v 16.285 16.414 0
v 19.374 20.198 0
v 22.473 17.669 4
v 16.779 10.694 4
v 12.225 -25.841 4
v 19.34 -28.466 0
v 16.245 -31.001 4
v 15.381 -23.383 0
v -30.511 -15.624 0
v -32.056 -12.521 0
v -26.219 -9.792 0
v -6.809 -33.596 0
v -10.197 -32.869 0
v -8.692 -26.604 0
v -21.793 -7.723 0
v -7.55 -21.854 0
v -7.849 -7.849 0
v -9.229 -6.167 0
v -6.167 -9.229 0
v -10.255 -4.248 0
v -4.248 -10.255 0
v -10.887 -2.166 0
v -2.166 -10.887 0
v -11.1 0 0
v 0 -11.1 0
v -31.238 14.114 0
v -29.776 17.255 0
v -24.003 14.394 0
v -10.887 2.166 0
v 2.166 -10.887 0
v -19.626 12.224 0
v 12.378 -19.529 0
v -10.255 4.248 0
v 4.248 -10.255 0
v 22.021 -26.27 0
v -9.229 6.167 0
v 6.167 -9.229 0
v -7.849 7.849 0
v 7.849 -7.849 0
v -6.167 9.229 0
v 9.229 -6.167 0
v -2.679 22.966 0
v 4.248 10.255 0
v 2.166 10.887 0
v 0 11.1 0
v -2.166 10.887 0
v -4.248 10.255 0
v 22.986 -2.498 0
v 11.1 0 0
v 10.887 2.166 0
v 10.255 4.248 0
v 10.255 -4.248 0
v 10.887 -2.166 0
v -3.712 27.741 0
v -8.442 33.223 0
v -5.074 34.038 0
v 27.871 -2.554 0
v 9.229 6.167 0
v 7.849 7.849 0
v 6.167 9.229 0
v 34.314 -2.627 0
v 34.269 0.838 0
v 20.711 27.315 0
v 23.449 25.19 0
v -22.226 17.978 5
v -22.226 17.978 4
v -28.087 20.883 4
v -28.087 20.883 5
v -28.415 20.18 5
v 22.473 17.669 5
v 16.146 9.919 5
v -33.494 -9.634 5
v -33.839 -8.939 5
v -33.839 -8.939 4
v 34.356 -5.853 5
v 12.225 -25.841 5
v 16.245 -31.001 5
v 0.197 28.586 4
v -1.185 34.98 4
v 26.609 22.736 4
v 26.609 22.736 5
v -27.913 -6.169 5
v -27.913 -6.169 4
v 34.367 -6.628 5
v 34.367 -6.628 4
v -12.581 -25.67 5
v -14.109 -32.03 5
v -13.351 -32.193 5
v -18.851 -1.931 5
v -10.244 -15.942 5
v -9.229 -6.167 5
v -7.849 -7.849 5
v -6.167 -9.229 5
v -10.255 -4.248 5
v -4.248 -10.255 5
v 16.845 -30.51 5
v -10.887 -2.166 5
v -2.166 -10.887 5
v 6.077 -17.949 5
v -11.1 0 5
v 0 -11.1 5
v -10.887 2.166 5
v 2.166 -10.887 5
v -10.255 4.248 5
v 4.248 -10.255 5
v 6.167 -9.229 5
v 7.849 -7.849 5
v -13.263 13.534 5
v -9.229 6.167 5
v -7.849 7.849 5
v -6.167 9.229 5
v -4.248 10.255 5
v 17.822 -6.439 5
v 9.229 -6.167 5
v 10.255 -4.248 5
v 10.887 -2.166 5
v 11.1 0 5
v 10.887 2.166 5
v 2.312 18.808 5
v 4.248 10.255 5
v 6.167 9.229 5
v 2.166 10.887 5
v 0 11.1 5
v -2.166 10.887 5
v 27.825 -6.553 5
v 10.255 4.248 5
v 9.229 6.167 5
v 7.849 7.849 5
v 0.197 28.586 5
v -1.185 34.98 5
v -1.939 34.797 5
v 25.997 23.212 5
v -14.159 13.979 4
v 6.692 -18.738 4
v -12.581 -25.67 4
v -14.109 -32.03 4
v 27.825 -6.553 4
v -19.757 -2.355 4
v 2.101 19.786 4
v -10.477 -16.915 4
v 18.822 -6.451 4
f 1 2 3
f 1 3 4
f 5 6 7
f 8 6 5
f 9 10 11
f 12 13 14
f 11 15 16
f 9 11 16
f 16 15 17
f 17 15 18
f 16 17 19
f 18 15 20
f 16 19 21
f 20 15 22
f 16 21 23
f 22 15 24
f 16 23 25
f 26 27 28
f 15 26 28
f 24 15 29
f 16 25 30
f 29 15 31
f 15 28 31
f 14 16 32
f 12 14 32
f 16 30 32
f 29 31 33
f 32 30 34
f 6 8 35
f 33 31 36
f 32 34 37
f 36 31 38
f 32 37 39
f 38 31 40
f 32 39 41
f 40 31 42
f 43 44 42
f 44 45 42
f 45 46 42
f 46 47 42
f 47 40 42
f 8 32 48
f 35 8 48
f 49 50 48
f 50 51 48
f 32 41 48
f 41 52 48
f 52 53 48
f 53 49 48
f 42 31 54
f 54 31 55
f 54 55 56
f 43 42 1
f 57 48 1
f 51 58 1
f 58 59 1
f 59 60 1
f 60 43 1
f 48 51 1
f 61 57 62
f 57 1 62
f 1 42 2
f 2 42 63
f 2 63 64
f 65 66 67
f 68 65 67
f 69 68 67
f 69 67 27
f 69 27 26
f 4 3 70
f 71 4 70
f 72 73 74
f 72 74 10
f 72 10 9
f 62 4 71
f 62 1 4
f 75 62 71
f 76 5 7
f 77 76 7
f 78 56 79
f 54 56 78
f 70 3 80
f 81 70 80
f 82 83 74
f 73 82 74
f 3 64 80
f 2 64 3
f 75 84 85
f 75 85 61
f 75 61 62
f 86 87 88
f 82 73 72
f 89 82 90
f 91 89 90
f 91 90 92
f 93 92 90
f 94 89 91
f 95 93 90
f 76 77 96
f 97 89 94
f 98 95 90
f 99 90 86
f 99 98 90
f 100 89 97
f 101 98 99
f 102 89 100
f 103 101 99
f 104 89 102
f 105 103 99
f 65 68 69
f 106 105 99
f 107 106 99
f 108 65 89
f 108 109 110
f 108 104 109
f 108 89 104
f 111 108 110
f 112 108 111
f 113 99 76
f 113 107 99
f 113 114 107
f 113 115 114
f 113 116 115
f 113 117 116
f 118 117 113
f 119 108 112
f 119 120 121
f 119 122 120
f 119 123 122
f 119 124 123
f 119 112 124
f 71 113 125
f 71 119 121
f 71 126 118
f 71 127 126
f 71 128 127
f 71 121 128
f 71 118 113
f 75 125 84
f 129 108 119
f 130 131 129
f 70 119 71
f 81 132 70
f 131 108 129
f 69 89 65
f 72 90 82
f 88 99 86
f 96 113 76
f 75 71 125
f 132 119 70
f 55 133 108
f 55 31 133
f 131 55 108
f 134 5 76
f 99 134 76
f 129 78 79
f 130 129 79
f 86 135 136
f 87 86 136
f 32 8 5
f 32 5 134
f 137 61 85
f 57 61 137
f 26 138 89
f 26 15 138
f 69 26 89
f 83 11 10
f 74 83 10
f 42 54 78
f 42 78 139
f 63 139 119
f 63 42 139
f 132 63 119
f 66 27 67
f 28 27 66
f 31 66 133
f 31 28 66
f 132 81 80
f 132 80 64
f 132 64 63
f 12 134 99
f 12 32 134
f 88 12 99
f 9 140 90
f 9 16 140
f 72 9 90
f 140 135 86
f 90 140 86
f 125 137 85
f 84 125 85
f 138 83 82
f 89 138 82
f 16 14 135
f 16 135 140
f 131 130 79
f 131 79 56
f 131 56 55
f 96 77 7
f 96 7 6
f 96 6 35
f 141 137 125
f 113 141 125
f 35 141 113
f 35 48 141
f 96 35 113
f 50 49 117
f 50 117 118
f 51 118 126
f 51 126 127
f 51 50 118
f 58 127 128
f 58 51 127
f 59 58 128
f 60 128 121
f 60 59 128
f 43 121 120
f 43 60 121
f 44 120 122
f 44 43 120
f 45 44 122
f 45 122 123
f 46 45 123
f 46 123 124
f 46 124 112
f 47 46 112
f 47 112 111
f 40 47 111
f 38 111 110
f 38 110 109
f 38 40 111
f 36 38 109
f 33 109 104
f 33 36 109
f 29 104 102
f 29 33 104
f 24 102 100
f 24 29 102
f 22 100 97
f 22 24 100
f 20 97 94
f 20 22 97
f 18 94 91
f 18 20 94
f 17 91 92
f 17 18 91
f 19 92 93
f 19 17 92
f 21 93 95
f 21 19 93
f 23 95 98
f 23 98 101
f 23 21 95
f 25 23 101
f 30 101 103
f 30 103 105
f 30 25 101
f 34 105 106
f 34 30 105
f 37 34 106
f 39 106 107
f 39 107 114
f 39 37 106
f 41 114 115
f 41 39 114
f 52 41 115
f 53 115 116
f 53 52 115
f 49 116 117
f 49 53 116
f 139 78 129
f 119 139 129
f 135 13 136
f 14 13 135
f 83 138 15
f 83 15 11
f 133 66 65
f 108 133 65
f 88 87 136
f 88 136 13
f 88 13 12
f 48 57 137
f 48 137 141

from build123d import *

# Parameters (mm, degrees)
F0_R         = 11.1
F1_DEPTH     = 5
F2_T4_DEPTH  = 66.9224244324
F2_T10_DEPTH = 66.9224244324
F2_T16_DEPTH = 66.9224244324
F2_T22_DEPTH = 66.9224244324
F2_T28_DEPTH = 66.9224244324
F2_T34_DEPTH = 66.9224244324
F2_T40_DEPTH = 66.9224244324
F3_SIZE      = 4


# Not quite as in the source:
# - a fillet or chamfer that OpenCascade refuses, or shapes differently, is made with other operations: its cross-section is extruded or revolved along the edge and cut away or added


with BuildPart() as f1:
    # F0 (on Top) → F1 (new body)
    with BuildSketch(Plane.XY):
        with BuildLine():
            ThreePointArc((13.9102940248, -6.3947663514), (14.9558155311, -3.2730564225), (15.3097784616, 0))
            ThreePointArc((15.3097784616, 0), (14.9174264356, 3.4437922532), (13.7604803953, 6.7110726292))
            ThreePointArc((13.7604803953, 6.7110726292), (13.7168049275, 6.7998955231), (13.6725561219, 6.8884341936))
            ThreePointArc((13.6725561219, 6.8884341936), (9.4080501116, 12.077992782), (3.3325913325, 14.9426621308))
            ThreePointArc((3.3325913325, 14.9426621308), (3.2359155889, 14.9638954436), (3.1391045899, 14.9845032923))
            ThreePointArc((3.1391045899, 14.9845032923), (-3.577131702, 14.8860150924), (-9.6048069761, 11.9221222731))
            ThreePointArc((-9.6048069761, 11.9221222731), (-9.6816841888, 11.8597768872), (-9.7581567243, 11.7969357838))
            ThreePointArc((-9.7581567243, 11.7969357838), (-13.8686603838, 6.4845644188), (-15.3095897294, -0.0760188232))
            ThreePointArc((-15.3095897294, -0.0760188232), (-15.308778302, -0.1749955606), (-15.307326995, -0.2739649836))
            ThreePointArc((-15.307326995, -0.2739649836), (-13.7168049275, -6.7998955231), (-9.4859391577, -12.0169161951))
            ThreePointArc((-9.4859391577, -12.0169161951), (-9.4080501116, -12.077992782), (-9.3297678259, -12.1385645305))
            ThreePointArc((-9.3297678259, -12.1385645305), (-3.2359155889, -14.9638954436), (3.4808170776, -14.9088305717))
            ThreePointArc((3.4808170776, -14.9088305717), (3.577131702, -14.8860150924), (3.6732968087, -14.8625774043))
            ThreePointArc((3.6732968087, -14.8625774043), (9.6816841888, -11.8597768872), (13.8264470578, -6.5740914431))
            ThreePointArc((13.8264470578, -6.5740914431), (13.8686603838, -6.4845644188), (13.9102940248, -6.3947663514))
        make_face()
        Circle(F0_R, mode=Mode.SUBTRACT)
        with BuildLine():
            ThreePointArc((13.6725561219, 6.8884341936), (13.7168049275, 6.7998955231), (13.7604803953, 6.7110726292))
            Line((13.7604803953, 6.7110726292), (28.1393743339, 1.1806929027))
            Line((28.1393743339, 1.1806929027), (27.8254993307, -6.5534854768))
            Line((27.8254993307, -6.5534854768), (34.3666750494, -6.6280952053))
            Line((34.3666750494, -6.6280952053), (34.1806906403, 7.5286378152))
            Line((34.1806906403, 7.5286378152), (22.47263633, 17.6688200307))
            Line((22.47263633, 17.6688200307), (13.6725561219, 6.8884341936))
        make_face()
        with BuildLine():
            ThreePointArc((13.7604803953, 6.7110726292), (14.9174264356, 3.4437922532), (15.3097784616, 0))
            ThreePointArc((15.3097784616, 0), (14.9558155311, -3.2730564225), (13.9102940248, -6.3947663514))
            Line((13.9102940248, -6.3947663514), (27.8254993307, -6.5534854768))
            Line((27.8254993307, -6.5534854768), (28.1393743339, 1.1806929027))
            Line((28.1393743339, 1.1806929027), (13.7604803953, 6.7110726292))
        make_face()
        with BuildLine():
            Line((27.8254993307, -6.5534854768), (13.9102940248, -6.3947663514))
            ThreePointArc((13.9102940248, -6.3947663514), (13.8686603838, -6.4845644188), (13.8264470578, -6.5740914431))
            Line((13.8264470578, -6.5740914431), (18.4677158103, -21.2640987672))
            Line((18.4677158103, -21.2640987672), (12.2251937987, -25.8408827536))
            Line((12.2251937987, -25.8408827536), (16.2452179168, -31.0014982676))
            Line((16.2452179168, -31.0014982676), (27.1974380987, -22.0295111355))
            Line((27.1974380987, -22.0295111355), (27.8254993307, -6.5534854768))
        make_face()
        with BuildLine():
            Line((18.4677158103, -21.2640987672), (13.8264470578, -6.5740914431))
            ThreePointArc((13.8264470578, -6.5740914431), (9.6816841888, -11.8597768872), (3.6732968087, -14.8625774043))
            Line((3.6732968087, -14.8625774043), (12.2251937987, -25.8408827536))
            Line((12.2251937987, -25.8408827536), (18.4677158103, -21.2640987672))
        make_face()
        with BuildLine():
            Line((12.2251937987, -25.8408827536), (3.6732968087, -14.8625774043))
            ThreePointArc((3.6732968087, -14.8625774043), (3.577131702, -14.8860150924), (3.4808170776, -14.9088305717))
            Line((3.4808170776, -14.9088305717), (-5.1105093912, -27.6965903568))
            Line((-5.1105093912, -27.6965903568), (-12.5809320123, -25.669568259))
            Line((-12.5809320123, -25.669568259), (-14.1092196492, -32.0301408191))
            Line((-14.1092196492, -32.0301408191), (-0.2660400579, -34.9989888809))
            Line((-0.2660400579, -34.9989888809), (12.2251937987, -25.8408827536))
        make_face()
        with BuildLine():
            Line((-5.1105093912, -27.6965903568), (3.4808170776, -14.9088305717))
            ThreePointArc((3.4808170776, -14.9088305717), (-3.2359155889, -14.9638954436), (-9.3297678259, -12.1385645305))
            Line((-9.3297678259, -12.1385645305), (-12.5809320123, -25.669568259))
            Line((-12.5809320123, -25.669568259), (-5.1105093912, -27.6965903568))
        make_face()
        with BuildLine():
            Line((-12.5809320123, -25.669568259), (-9.3297678259, -12.1385645305))
            ThreePointArc((-9.3297678259, -12.1385645305), (-9.4080501116, -12.077992782), (-9.4859391577, -12.0169161951))
            Line((-9.4859391577, -12.0169161951), (-24.8404167857, -13.2729845003))
            Line((-24.8404167857, -13.2729845003), (-27.9133594138, -6.1685453016))
            Line((-27.9133594138, -6.1685453016), (-33.8391270437, -8.939434038))
            Line((-33.8391270437, -8.939434038), (-27.5291846246, -21.6135141498))
            Line((-27.5291846246, -21.6135141498), (-12.5809320123, -25.669568259))
        make_face()
        with BuildLine():
            ThreePointArc((-15.307326995, -0.2739649836), (-15.308778302, -0.1749955606), (-15.3095897294, -0.0760188232))
            Line((-15.3095897294, -0.0760188232), (-25.8649836884, 11.1454494045))
            Line((-25.8649836884, 11.1454494045), (-22.2264578479, 17.9775180833))
            Line((-22.2264578479, 17.9775180833), (-28.0874815819, 20.8828489049))
            Line((-28.0874815819, 20.8828489049), (-34.062291676, 8.0473775715))
            Line((-34.062291676, 8.0473775715), (-27.9133594138, -6.1685453016))
            Line((-27.9133594138, -6.1685453016), (-15.307326995, -0.2739649836))
        make_face()
        with BuildLine():
            ThreePointArc((-15.3095897294, -0.0760188232), (-13.8686603838, 6.4845644188), (-9.7581567243, 11.7969357838))
            Line((-9.7581567243, 11.7969357838), (-22.2264578479, 17.9775180833))
            Line((-22.2264578479, 17.9775180833), (-25.8649836884, 11.1454494045))
            Line((-25.8649836884, 11.1454494045), (-15.3095897294, -0.0760188232))
        make_face()
        with BuildLine():
            ThreePointArc((-9.7581567243, 11.7969357838), (-9.6816841888, 11.8597768872), (-9.6048069761, 11.9221222731))
            Line((-9.6048069761, 11.9221222731), (-7.4126903243, 27.171132582))
            Line((-7.4126903243, 27.171132582), (0.1974198146, 28.5861436769))
            Line((0.1974198146, 28.5861436769), (-1.1853896087, 34.97992069))
            Line((-1.1853896087, 34.97992069), (-14.9457983513, 31.6484298448))
            Line((-14.9457983513, 31.6484298448), (-22.2264578479, 17.9775180833))
            Line((-22.2264578479, 17.9775180833), (-9.7581567243, 11.7969357838))
        make_face()
        with BuildLine():
            ThreePointArc((-9.6048069761, 11.9221222731), (-3.577131702, 14.8860150924), (3.1391045899, 14.9845032923))
            Line((3.1391045899, 14.9845032923), (0.1974198146, 28.5861436769))
            Line((0.1974198146, 28.5861436769), (-7.4126903243, 27.171132582))
            Line((-7.4126903243, 27.171132582), (-9.6048069761, 11.9221222731))
        make_face()
        with BuildLine():
            ThreePointArc((3.1391045899, 14.9845032923), (3.2359155889, 14.9638954436), (3.3325913325, 14.9426621308))
            Line((3.3325913325, 14.9426621308), (16.6215100454, 22.7363987351))
            Line((16.6215100454, 22.7363987351), (22.47263633, 17.6688200307))
            Line((22.47263633, 17.6688200307), (26.6093249174, 22.7363987351))
            Line((26.6093249174, 22.7363987351), (15.4251859707, 31.4175689347))
            Line((15.4251859707, 31.4175689347), (0.1974198146, 28.5861436769))
            Line((0.1974198146, 28.5861436769), (3.1391045899, 14.9845032923))
        make_face()
        with BuildLine():
            ThreePointArc((3.3325913325, 14.9426621308), (9.4080501116, 12.077992782), (13.6725561219, 6.8884341936))
            Line((13.6725561219, 6.8884341936), (22.47263633, 17.6688200307))
            Line((22.47263633, 17.6688200307), (16.6215100454, 22.7363987351))
            Line((16.6215100454, 22.7363987351), (3.3325913325, 14.9426621308))
        make_face()
        with BuildLine():
            Line((-24.8404167857, -13.2729845003), (-9.4859391577, -12.0169161951))
            ThreePointArc((-9.4859391577, -12.0169161951), (-13.7168049275, -6.7998955231), (-15.307326995, -0.2739649836))
            Line((-15.307326995, -0.2739649836), (-27.9133594138, -6.1685453016))
            Line((-27.9133594138, -6.1685453016), (-24.8404167857, -13.2729845003))
        make_face()
    extrude(amount=F1_DEPTH)

    # F2: chamfer of 10 on 7 edges, made by hand


with BuildPart() as f2_tool2:
    # F2_s3 → F2_t4 (new body)
    with BuildSketch(Plane(origin=(-1.8906345765, -46.5870327993, 0), x_dir=(0, 0, 1), z_dir=(0.0405494722, 0.9991775319, 0))):
        with BuildLine():
            Line((-5.2828427125, 28.3511968353), (5.2828427125, 17.7855114104))
            Line((5.2828427125, 17.7855114104), (5.4828427125, 17.7855114104))
            ThreePointArc((5.4828427125, 17.7855114104), (5.2, 22.9269327666), (5.2, 28.0683541229))
            Line((5.2, 28.0683541229), (5, 28.2683541229))
            ThreePointArc((5, 28.2683541229), (-0.1414213562, 28.2683541229), (-5.2828427125, 28.5511968353))
            Line((-5.2828427125, 28.5511968353), (-5.2828427125, 28.3511968353))
        make_face()
    extrude(amount=F2_T4_DEPTH)

    split(bisect_by=Plane(origin=(21.7213280078, -26.5155047015, 0), x_dir=(0, 0, 1), z_dir=(-0.6337064464, 0.7735736163, 0)), keep=Keep.TOP)

    split(bisect_by=Plane(origin=(-0.0711207687, -6.2352920297, 0), x_dir=(0, 0, 1), z_dir=(-0.0114054229, -0.999934956, 0)), keep=Keep.TOP)


with BuildPart() as f1_1:
    add(f1.part)

    # F2_t1: cut F2_tool2
    add(f2_tool2.part, mode=Mode.SUBTRACT)


with BuildPart() as f2_tool8:
    # F2_s9 → F2_t10 (new body)
    with BuildSketch(Plane(origin=(-37.6020002947, -27.5683822155, 0), x_dir=(0, 0, 1), z_dir=(0.8064706334, 0.5912741475, 0))):
        with BuildLine():
            Line((-5.2828427125, 28.3511968353), (5.2828427125, 17.7855114104))
            Line((5.2828427125, 17.7855114104), (5.4828427125, 17.7855114104))
            ThreePointArc((5.4828427125, 17.7855114104), (5.2, 22.9269327666), (5.2, 28.0683541229))
            Line((5.2, 28.0683541229), (5, 28.2683541229))
            ThreePointArc((5, 28.2683541229), (-0.1414213562, 28.2683541229), (-5.2828427125, 28.5511968353))
            Line((-5.2828427125, 28.5511968353), (-5.2828427125, 28.3511968353))
        make_face()
    extrude(amount=F2_T10_DEPTH)

    split(bisect_by=Plane(origin=(-7.1876298535, -33.51456485, 0), x_dir=(0, 0, 1), z_dir=(0.2096947006, 0.9777669112, 0)), keep=Keep.TOP)

    split(bisect_by=Plane(origin=(-4.9192906851, -3.8320365361, 0), x_dir=(0, 0, 1), z_dir=(-0.7888917939, -0.6145321289, 0)), keep=Keep.TOP)


with BuildPart() as f1_2:
    add(f1_1.part)

    # F2_t7: cut F2_tool8
    add(f2_tool8.part, mode=Mode.SUBTRACT)


with BuildPart() as f2_tool14:
    # F2_s15 → F2_t16 (new body)
    with BuildSketch(Plane(origin=(-44.99829285, 12.2098224691, 0), x_dir=(0, 0, 1), z_dir=(0.9651029587, -0.2618707298, 0))):
        with BuildLine():
            Line((-5.2828427125, 28.3511968353), (5.2828427125, 17.7855114104))
            Line((5.2828427125, 17.7855114104), (5.4828427125, 17.7855114104))
            ThreePointArc((5.4828427125, 17.7855114104), (5.2, 22.9269327666), (5.2, 28.0683541229))
            Line((5.2, 28.0683541229), (5, 28.2683541229))
            ThreePointArc((5, 28.2683541229), (-0.1414213562, 28.2683541229), (-5.2828427125, 28.5511968353))
            Line((-5.2828427125, 28.5511968353), (-5.2828427125, 28.3511968353))
        make_face()
    extrude(amount=F2_T16_DEPTH)

    split(bisect_by=Plane(origin=(-30.6841558342, -15.2764740939, 0), x_dir=(0, 0, 1), z_dir=(0.895191461, 0.4456817791, 0)), keep=Keep.TOP)

    split(bisect_by=Plane(origin=(-6.0631343805, 1.4568206285, 0), x_dir=(0, 0, 1), z_dir=(-0.9723265537, 0.2336259255, 0)), keep=Keep.TOP)


with BuildPart() as f1_3:
    add(f1_2.part)

    # F2_t13: cut F2_tool14
    add(f2_tool14.part, mode=Mode.SUBTRACT)


with BuildPart() as f2_tool20:
    # F2_s21 → F2_t22 (new body)
    with BuildSketch(Plane(origin=(-18.5099530914, 42.7937817994, 0), x_dir=(0, 0, 1), z_dir=(0.3969930716, -0.9178216064, 0))):
        with BuildLine():
            Line((-5.2828427125, 28.3511968353), (5.2828427125, 17.7855114104))
            Line((5.2828427125, 17.7855114104), (5.4828427125, 17.7855114104))
            ThreePointArc((5.4828427125, 17.7855114104), (5.2, 22.9269327666), (5.2, 28.0683541229))
            Line((5.2, 28.0683541229), (5, 28.2683541229))
            ThreePointArc((5, 28.2683541229), (-0.1414213562, 28.2683541229), (-5.2828427125, 28.5511968353))
            Line((-5.2828427125, 28.5511968353), (-5.2828427125, 28.3511968353))
        make_face()
    extrude(amount=F2_T22_DEPTH)

    split(bisect_by=Plane(origin=(-31.074886629, 14.4651132382, 0), x_dir=(0, 0, 1), z_dir=(0.9065907927, -0.4220108229, 0)), keep=Keep.TOP)

    split(bisect_by=Plane(origin=(-2.6413142219, 5.6486621461, 0), x_dir=(0, 0, 1), z_dir=(-0.4235795866, 0.9058588929, 0)), keep=Keep.TOP)


with BuildPart() as f1_4:
    add(f1_3.part)

    # F2_t19: cut F2_tool20
    add(f2_tool20.part, mode=Mode.SUBTRACT)


with BuildPart() as f2_tool26:
    # F2_s27 → F2_t28 (new body)
    with BuildSketch(Plane(origin=(21.9167588793, 41.1531506007, 0), x_dir=(0, 0, 1), z_dir=(-0.4700606956, -0.8826340932, 0))):
        with BuildLine():
            Line((-5.2828427125, 28.3511968353), (5.2828427125, 17.7855114104))
            Line((5.2828427125, 17.7855114104), (5.4828427125, 17.7855114104))
            ThreePointArc((5.4828427125, 17.7855114104), (5.2, 22.9269327666), (5.2, 28.0683541229))
            Line((5.2, 28.0683541229), (5, 28.2683541229))
            ThreePointArc((5, 28.2683541229), (-0.1414213562, 28.2683541229), (-5.2828427125, 28.5511968353))
            Line((-5.2828427125, 28.5511968353), (-5.2828427125, 28.3511968353))
        make_face()
    extrude(amount=F2_T28_DEPTH)

    split(bisect_by=Plane(origin=(-8.06559398, 33.3141752674, 0), x_dir=(0, 0, 1), z_dir=(0.2353087664, -0.9719206678, 0)), keep=Keep.TOP)

    split(bisect_by=Plane(origin=(2.7694694188, 5.586945856, 0), x_dir=(0, 0, 1), z_dir=(0.4441314486, 0.8959616378, 0)), keep=Keep.TOP)


with BuildPart() as f1_5:
    add(f1_4.part)

    # F2_t25: cut F2_tool26
    add(f2_tool26.part, mode=Mode.SUBTRACT)


with BuildPart() as f2_tool32:
    # F2_s33 → F2_t34 (new body)
    with BuildSketch(Plane(origin=(45.8397043935, 8.5233576284, 0), x_dir=(0, 0, 1), z_dir=(-0.9831491715, -0.1828051054, 0))):
        with BuildLine():
            Line((-5.2828427125, 28.3511968353), (5.2828427125, 17.7855114104))
            Line((5.2828427125, 17.7855114104), (5.4828427125, 17.7855114104))
            ThreePointArc((5.4828427125, 17.7855114104), (5.2, 22.9269327666), (5.2, 28.0683541229))
            Line((5.2, 28.0683541229), (5, 28.2683541229))
            ThreePointArc((5, 28.2683541229), (-0.1414213562, 28.2683541229), (-5.2828427125, 28.5511968353))
            Line((-5.2828427125, 28.5511968353), (-5.2828427125, 28.3511968353))
        make_face()
    extrude(amount=F2_T34_DEPTH)

    split(bisect_by=Plane(origin=(21.017255444, 27.0769838349, 0), x_dir=(0, 0, 1), z_dir=(-0.6131655604, -0.7899544263, 0)), keep=Keep.TOP)

    split(bisect_by=Plane(origin=(6.0947861002, 1.3181453834, 0), x_dir=(0, 0, 1), z_dir=(0.9774024444, 0.2113869951, 0)), keep=Keep.TOP)


with BuildPart() as f1_6:
    add(f1_5.part)

    # F2_t31: cut F2_tool32
    add(f2_tool32.part, mode=Mode.SUBTRACT)


with BuildPart() as f2_tool38:
    # F2_s39 → F2_t40 (new body)
    with BuildSketch(Plane(origin=(35.2444175398, -30.5246974829, 0), x_dir=(0, 0, 1), z_dir=(-0.7559062687, 0.6546798553, 0))):
        with BuildLine():
            Line((-5.2828427125, 28.3511968353), (5.2828427125, 17.7855114104))
            Line((5.2828427125, 17.7855114104), (5.4828427125, 17.7855114104))
            ThreePointArc((5.4828427125, 17.7855114104), (5.2, 22.9269327666), (5.2, 28.0683541229))
            Line((5.2, 28.0683541229), (5, 28.2683541229))
            ThreePointArc((5, 28.2683541229), (-0.1414213562, 28.2683541229), (-5.2828427125, 28.5511968353))
            Line((-5.2828427125, 28.5511968353), (-5.2828427125, 28.3511968353))
        make_face()
    extrude(amount=F2_T40_DEPTH)

    split(bisect_by=Plane(origin=(34.2736828448, 0.4502713049, 0), x_dir=(0, 0, 1), z_dir=(-0.9999137139, -0.0131363897, 0)), keep=Keep.TOP)

    split(bisect_by=Plane(origin=(4.8306045372, -3.9432454481, 0), x_dir=(0, 0, 1), z_dir=(0.7746694642, -0.6323663663, 0)), keep=Keep.TOP)


with BuildPart() as f1_7:
    add(f1_6.part)

    # F2_t37: cut F2_tool38
    add(f2_tool38.part, mode=Mode.SUBTRACT)

    # F3
    f3_edges = [f1_7.edges().sort_by_distance(p)[0] for p in [
        (22.959393, 18.265112, 0),
        (28.595187, -6.562265, 0),
        (12.698222, -26.448123, 0),
        (-12.760763, -26.418005, 0),
        (-28.610633, -6.49459, 0),
        (-22.916113, 18.319383, 0),
        (0.034707, 29.338487, 0),
    ]]
    chamfer(f3_edges, length=F3_SIZE)


solid = f1_7.part
